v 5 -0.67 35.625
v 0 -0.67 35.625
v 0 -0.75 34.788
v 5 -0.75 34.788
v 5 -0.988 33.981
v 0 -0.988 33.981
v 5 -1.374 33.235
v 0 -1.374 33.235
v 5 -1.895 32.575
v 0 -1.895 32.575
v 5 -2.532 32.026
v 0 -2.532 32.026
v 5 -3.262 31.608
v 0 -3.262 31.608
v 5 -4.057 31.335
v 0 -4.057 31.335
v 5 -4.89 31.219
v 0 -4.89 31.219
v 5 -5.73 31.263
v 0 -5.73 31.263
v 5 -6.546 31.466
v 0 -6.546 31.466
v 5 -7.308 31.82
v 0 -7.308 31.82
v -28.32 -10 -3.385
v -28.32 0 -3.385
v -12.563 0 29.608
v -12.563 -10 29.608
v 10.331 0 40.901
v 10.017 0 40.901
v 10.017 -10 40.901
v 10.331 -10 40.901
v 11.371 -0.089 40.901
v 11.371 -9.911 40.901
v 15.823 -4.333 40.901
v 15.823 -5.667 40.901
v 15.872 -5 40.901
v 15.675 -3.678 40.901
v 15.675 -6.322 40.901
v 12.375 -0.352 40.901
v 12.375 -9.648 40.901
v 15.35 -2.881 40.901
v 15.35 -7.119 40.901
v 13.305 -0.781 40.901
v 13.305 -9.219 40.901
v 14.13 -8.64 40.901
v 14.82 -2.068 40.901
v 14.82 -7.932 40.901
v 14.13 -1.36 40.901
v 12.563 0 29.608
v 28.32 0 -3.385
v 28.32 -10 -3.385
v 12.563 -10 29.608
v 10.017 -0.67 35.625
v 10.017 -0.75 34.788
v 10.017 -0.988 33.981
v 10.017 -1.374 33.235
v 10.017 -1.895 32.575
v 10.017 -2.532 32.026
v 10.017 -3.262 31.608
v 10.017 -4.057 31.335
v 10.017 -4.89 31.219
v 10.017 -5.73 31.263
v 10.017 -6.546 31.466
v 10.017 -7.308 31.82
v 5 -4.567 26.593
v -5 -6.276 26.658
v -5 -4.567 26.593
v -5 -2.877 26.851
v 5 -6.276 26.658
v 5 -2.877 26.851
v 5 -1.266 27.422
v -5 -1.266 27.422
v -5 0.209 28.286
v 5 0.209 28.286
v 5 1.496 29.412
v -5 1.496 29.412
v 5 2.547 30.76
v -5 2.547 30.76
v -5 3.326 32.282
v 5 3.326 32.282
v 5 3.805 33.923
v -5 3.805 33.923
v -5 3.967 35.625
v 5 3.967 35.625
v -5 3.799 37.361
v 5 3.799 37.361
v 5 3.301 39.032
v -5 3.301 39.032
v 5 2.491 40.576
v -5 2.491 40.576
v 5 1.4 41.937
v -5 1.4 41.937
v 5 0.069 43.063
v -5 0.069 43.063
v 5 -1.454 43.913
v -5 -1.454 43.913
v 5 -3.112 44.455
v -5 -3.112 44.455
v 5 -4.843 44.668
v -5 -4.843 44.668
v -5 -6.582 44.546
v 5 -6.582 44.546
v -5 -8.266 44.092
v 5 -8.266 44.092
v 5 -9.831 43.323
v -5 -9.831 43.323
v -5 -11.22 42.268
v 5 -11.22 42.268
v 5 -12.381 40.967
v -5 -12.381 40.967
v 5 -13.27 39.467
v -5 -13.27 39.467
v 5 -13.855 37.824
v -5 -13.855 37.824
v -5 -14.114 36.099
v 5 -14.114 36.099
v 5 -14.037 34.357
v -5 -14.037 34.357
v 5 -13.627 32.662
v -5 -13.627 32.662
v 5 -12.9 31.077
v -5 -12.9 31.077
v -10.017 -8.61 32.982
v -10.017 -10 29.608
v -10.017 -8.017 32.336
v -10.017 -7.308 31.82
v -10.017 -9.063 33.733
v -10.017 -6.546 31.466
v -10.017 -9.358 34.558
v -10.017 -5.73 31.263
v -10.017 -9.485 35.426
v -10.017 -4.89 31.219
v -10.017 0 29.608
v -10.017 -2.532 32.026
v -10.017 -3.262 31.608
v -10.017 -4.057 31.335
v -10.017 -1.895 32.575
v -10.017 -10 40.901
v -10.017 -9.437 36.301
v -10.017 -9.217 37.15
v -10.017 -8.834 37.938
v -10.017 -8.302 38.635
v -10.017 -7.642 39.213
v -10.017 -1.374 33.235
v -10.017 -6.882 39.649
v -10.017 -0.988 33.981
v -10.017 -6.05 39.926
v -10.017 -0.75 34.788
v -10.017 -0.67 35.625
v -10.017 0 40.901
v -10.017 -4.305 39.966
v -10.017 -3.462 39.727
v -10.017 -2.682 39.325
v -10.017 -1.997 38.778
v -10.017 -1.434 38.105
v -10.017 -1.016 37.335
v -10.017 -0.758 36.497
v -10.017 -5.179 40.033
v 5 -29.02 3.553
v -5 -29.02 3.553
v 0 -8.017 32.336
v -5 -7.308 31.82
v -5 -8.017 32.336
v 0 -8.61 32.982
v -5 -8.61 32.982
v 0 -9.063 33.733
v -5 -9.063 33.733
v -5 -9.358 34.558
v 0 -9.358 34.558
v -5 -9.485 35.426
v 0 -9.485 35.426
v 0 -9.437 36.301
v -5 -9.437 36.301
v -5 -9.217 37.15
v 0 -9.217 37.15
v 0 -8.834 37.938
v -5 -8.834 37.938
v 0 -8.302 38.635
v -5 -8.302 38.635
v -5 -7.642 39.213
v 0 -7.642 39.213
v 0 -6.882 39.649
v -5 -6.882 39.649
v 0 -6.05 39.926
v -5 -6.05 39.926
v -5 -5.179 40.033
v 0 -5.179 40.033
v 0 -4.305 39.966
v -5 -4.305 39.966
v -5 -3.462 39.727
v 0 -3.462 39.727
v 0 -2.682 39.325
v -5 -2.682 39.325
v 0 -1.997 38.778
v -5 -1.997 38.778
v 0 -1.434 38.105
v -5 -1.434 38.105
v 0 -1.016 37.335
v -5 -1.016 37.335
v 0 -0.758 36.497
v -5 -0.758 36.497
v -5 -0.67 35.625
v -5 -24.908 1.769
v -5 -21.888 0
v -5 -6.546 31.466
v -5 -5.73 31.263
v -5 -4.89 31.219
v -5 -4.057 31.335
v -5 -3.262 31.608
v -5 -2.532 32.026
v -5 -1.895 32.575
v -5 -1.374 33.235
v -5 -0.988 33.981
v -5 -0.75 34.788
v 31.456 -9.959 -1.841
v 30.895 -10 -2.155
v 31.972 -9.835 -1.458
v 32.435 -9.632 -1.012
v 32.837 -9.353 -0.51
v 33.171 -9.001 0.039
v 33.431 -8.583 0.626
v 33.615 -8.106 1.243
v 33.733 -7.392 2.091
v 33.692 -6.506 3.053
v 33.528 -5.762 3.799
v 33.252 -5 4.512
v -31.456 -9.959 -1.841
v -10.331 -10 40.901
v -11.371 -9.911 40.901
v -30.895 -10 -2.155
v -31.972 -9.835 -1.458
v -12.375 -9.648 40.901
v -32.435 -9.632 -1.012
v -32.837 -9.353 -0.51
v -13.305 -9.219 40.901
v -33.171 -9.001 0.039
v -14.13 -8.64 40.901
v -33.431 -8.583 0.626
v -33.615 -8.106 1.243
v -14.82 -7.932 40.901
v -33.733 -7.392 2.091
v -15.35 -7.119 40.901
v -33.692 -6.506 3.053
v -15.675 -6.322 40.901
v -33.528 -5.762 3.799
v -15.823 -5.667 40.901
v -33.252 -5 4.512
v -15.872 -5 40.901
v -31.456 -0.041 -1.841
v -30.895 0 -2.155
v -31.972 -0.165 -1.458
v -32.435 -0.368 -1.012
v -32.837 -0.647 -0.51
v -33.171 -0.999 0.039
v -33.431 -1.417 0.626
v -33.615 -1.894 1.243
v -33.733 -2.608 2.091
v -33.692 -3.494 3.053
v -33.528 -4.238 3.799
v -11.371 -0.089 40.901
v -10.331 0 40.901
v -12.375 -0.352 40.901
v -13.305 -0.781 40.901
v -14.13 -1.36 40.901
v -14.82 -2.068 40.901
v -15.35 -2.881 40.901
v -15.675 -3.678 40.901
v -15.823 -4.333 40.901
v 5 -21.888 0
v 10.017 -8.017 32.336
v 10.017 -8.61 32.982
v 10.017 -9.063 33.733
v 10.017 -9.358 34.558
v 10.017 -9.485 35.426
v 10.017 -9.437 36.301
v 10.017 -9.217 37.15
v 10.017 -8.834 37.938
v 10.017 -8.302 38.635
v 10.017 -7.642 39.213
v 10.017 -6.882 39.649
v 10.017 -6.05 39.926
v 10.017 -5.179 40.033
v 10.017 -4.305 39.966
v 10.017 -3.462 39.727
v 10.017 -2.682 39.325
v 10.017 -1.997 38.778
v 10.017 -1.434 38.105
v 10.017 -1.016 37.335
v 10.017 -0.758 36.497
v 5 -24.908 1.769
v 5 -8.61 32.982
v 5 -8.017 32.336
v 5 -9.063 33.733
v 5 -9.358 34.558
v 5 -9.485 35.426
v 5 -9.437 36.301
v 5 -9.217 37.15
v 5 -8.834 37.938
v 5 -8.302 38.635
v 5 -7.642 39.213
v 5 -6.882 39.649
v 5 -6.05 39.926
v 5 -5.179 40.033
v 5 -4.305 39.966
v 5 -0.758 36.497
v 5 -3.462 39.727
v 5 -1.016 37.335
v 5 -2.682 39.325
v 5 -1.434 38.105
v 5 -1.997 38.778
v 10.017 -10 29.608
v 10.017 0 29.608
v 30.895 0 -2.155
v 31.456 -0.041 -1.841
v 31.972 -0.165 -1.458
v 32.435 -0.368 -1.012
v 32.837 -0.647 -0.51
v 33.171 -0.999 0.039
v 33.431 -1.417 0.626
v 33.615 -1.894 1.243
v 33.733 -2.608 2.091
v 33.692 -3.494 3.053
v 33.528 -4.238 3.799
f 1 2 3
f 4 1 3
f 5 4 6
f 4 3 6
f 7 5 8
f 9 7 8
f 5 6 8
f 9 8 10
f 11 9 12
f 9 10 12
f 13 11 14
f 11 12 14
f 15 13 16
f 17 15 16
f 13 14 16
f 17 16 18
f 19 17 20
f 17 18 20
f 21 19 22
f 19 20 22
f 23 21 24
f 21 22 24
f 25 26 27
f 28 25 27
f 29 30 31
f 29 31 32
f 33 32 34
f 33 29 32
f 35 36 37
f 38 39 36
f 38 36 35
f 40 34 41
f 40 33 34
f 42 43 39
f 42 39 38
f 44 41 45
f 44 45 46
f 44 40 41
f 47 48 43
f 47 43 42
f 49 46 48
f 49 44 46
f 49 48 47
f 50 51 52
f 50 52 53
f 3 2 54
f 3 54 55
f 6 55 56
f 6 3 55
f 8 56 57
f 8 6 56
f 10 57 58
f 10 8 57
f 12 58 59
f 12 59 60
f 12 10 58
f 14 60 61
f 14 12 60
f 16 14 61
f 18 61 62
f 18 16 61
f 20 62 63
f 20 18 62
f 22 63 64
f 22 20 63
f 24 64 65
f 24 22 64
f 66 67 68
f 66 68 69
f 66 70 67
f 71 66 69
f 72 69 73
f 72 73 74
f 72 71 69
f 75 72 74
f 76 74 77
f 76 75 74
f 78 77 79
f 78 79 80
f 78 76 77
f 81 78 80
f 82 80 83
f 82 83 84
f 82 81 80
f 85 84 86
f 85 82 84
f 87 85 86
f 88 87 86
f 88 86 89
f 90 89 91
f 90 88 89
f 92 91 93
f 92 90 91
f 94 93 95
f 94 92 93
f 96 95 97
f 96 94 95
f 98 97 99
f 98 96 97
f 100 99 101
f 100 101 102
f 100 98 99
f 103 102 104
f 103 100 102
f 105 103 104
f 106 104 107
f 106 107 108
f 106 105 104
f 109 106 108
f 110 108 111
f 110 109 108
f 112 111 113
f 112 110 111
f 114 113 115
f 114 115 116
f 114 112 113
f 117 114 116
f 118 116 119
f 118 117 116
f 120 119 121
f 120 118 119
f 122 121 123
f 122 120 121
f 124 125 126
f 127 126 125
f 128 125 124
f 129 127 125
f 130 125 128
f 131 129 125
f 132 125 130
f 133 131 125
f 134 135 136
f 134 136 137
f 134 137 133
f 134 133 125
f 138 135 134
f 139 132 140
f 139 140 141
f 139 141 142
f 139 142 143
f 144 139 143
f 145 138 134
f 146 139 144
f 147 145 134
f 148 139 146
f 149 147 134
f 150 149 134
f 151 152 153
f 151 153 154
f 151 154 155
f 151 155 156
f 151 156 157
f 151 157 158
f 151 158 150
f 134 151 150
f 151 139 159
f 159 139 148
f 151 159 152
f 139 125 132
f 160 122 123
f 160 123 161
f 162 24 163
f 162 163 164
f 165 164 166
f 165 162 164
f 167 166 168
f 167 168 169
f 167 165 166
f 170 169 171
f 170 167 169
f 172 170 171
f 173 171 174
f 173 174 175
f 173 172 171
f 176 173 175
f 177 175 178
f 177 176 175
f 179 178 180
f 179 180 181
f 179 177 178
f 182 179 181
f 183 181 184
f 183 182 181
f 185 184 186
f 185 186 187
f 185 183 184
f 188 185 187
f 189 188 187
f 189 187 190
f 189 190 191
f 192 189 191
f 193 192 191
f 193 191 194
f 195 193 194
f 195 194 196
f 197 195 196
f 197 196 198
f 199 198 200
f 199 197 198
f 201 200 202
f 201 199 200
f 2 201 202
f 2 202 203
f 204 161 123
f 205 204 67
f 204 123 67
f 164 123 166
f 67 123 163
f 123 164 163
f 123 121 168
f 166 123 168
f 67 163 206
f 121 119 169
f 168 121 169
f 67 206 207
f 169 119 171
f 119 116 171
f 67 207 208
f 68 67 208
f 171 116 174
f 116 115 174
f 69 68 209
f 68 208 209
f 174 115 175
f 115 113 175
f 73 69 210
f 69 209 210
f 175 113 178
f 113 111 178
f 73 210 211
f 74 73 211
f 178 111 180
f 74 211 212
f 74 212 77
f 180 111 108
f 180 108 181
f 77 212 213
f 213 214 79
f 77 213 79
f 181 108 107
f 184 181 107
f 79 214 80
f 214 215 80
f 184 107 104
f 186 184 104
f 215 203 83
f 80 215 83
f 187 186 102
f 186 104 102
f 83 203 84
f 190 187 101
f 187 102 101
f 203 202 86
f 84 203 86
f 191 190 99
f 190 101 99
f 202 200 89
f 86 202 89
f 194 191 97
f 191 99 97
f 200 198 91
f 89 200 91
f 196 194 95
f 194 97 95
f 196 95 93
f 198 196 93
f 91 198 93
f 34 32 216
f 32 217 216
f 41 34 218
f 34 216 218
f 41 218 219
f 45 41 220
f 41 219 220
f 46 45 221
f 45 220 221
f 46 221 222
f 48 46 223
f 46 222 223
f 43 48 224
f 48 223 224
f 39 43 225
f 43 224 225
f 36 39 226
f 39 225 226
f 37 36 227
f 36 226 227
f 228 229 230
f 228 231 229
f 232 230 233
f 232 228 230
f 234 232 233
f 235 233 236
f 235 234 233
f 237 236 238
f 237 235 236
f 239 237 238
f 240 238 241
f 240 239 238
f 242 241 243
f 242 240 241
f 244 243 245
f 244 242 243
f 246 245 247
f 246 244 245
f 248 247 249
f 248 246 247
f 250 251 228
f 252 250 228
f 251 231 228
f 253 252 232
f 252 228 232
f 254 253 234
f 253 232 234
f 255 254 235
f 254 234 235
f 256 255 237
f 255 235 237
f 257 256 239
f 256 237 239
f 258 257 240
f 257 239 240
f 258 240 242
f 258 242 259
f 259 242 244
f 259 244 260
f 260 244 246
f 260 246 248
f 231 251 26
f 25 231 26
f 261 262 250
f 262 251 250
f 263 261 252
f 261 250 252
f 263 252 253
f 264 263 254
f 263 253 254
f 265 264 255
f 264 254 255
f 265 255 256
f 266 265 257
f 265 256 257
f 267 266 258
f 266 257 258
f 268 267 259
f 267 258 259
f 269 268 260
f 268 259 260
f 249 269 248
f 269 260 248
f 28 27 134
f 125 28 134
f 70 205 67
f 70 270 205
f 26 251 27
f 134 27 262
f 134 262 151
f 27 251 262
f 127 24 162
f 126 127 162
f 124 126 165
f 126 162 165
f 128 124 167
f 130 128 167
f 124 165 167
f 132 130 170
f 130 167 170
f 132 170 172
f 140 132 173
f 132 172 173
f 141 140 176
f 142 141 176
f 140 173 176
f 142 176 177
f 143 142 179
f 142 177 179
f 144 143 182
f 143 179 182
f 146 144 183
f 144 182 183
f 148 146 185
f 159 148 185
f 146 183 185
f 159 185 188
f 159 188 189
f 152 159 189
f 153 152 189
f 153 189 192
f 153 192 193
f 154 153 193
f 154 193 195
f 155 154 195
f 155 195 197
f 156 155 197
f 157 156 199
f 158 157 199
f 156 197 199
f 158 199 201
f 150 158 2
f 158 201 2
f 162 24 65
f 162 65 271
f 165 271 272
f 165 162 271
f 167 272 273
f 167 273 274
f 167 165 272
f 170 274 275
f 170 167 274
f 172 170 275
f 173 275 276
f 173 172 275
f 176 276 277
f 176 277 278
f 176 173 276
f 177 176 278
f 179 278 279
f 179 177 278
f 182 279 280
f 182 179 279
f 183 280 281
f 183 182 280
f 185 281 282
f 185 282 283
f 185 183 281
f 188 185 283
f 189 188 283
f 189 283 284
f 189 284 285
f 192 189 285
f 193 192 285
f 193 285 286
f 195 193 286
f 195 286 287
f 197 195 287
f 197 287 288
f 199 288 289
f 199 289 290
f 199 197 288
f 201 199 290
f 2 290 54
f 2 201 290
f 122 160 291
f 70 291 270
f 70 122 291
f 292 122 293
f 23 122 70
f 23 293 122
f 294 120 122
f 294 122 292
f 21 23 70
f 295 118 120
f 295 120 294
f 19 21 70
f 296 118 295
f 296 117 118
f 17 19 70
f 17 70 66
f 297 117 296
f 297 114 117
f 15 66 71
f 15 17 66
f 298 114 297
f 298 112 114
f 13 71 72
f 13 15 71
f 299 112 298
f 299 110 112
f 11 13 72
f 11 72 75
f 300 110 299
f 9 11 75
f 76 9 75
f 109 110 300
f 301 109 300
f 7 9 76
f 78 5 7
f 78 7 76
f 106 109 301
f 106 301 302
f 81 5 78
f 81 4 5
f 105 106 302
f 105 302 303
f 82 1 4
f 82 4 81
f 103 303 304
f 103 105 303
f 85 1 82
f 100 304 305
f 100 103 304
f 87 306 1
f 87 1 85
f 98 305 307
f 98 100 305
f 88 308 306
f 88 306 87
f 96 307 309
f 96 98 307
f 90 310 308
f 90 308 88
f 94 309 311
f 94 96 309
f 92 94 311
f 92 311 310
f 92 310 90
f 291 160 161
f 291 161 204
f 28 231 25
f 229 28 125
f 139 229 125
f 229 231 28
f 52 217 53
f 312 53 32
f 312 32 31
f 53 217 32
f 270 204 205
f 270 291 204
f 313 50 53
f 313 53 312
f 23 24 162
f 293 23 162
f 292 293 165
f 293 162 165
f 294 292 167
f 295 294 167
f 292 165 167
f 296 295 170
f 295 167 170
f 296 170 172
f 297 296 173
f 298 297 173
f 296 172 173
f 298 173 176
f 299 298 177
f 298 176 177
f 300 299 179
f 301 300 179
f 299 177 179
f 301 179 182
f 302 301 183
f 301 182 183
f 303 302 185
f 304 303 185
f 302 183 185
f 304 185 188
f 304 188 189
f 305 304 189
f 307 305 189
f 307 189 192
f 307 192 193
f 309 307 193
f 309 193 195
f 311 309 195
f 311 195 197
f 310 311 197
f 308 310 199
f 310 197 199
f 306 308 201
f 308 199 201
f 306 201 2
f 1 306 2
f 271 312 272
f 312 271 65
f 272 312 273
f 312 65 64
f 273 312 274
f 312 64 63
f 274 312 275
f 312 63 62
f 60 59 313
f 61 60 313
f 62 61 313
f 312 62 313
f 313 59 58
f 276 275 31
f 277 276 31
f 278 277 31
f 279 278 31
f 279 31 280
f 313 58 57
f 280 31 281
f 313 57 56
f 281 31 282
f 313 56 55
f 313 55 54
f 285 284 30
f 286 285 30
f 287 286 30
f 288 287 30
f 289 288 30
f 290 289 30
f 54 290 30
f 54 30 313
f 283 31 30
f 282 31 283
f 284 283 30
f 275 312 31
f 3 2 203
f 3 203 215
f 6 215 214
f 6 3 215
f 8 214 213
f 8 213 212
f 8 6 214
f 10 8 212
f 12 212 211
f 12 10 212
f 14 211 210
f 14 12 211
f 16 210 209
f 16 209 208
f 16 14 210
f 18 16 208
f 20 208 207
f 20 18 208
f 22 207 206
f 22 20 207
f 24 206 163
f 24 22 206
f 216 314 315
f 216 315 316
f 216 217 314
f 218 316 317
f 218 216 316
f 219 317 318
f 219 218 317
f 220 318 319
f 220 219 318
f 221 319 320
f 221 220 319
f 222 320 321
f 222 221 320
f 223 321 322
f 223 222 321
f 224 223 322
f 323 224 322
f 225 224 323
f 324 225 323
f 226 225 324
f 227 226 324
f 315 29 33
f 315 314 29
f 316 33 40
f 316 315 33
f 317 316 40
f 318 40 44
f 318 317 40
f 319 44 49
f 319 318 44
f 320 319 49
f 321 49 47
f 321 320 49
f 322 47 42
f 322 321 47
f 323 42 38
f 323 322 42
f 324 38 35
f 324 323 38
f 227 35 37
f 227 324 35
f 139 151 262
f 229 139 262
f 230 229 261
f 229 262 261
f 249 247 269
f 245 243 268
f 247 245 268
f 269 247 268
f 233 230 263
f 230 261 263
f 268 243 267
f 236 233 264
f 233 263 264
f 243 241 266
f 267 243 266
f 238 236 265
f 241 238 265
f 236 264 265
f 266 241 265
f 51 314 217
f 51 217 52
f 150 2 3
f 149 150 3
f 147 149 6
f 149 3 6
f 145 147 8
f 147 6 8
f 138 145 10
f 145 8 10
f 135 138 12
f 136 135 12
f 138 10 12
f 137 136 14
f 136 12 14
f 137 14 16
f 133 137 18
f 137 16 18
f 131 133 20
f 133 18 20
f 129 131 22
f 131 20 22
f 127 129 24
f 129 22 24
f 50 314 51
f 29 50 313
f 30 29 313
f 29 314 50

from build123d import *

# Parameters (mm, degrees)
F1_DEPTH = 10
F3_DEPTH = 10.01716
F4_R     = 4.99999
F6_DEPTH = 5


# Not quite as in the source:
# - a fillet or chamfer is up to 0.001 mm smaller than in the source, because OpenCascade refuses the exact size


with BuildPart() as f1:
    # F0 (on Front) → F1 (new body)
    with BuildSketch(Plane.XZ):
        Polygon((-12.5626804332, 29.607558623), (0, 29.607558623), (0, 40.9011654556), (-15.8720966429, 40.9011654556), (-35.4069806635, 0), (-28.3201927203, -3.3847343715), align=None)
    extrude(amount=F1_DEPTH)

    # F2 (on face) → F3 (cut)
    with BuildSketch(Plane.YZ):
        Polygon((-10, 29.607558623), (-8.6038469049, 29.607558623), (0, 29.607558623), (0, 40.9011654556), (-10, 40.9011654556), align=None)
        with BuildLine():
            ThreePointArc((-7.3082493459, 31.8197726236), (-7.2727253308, 39.4503255628), (-0.6703296735, 35.6247574091))
            ThreePointArc((-0.6703296735, 35.6247574091), (-2.8869450444, 31.7991892554), (-7.3082493459, 31.8197726236))
        make_face(mode=Mode.SUBTRACT)
    extrude(amount=-F3_DEPTH, mode=Mode.SUBTRACT)

    # F4 (radius 5 in the source; OpenCascade refuses exactly that, so slightly less here)
    f4_edges = [f1.edges().sort_by_distance(p)[0] for p in [
        (-25.639539, -10, 20.450583),
        (-25.639539, 0, 20.450583),
        (-35.406981, -5, 0),
    ]]
    fillet(f4_edges, radius=F4_R)

    # F5: F1 across face


with BuildPart() as f1_1:
    add(f1.part)
    add(f1.part.mirror(Plane(origin=(0, -5.0798351876, 35.6247574091), x_dir=(0, 1, 0), z_dir=(1, 0, 0))))


with BuildPart() as f6:
    # F2 (on face) → F6 (new body, symmetric)
    with BuildSketch(Plane.YZ):
        with BuildLine():
            ThreePointArc((-12.9000592681, 31.0769466924), (-11.4864525822, 29.2377596368), (-9.6516098344, 27.8185186501))
            ThreePointArc((-9.6516098344, 27.8185186501), (-8.0214187442, 27.0699007087), (-6.2755623418, 26.6576662667))
            ThreePointArc((-6.2755623418, 26.6576662667), (0.8792497216, 28.8183050271), (3.9666274903, 35.6247574091))
            ThreePointArc((3.9666274903, 35.6247574091), (-7.4349489542, 44.3592823607), (-12.9000592681, 31.0769466924))
        make_face()
        Polygon((0, 29.607558623), (-8.6038469049, 29.607558623), (-10, 29.607558623), (-10, 40.9011654556), (0, 40.9011654556), align=None, mode=Mode.SUBTRACT)
        with BuildLine():
            Line((-24.9078488827, 1.768712223), (-9.6516098344, 27.8185186501))
            ThreePointArc((-9.6516098344, 27.8185186501), (-11.4864525822, 29.2377596368), (-12.9000592681, 31.0769466924))
            Line((-12.9000592681, 31.0769466924), (-29.0196302747, 3.553013495))
            Line((-29.0196302747, 3.553013495), (-24.9078488827, 1.768712223))
        make_face()
        with BuildLine():
            ThreePointArc((-6.2755623418, 26.6576662667), (-8.0214187442, 27.0699007087), (-9.6516098344, 27.8185186501))
            Line((-9.6516098344, 27.8185186501), (-24.9078488827, 1.768712223))
            Line((-24.9078488827, 1.768712223), (-21.8877984701, 0))
            Line((-21.8877984701, 0), (-6.2755623418, 26.6576662667))
        make_face()
        Polygon((-10, 29.607558623), (-8.6038469049, 29.607558623), (0, 29.607558623), (0, 40.9011654556), (-10, 40.9011654556), align=None)
        with BuildLine():
            ThreePointArc((-7.3082493459, 31.8197726236), (-7.2727253308, 39.4503255628), (-0.6703296735, 35.6247574091))
            ThreePointArc((-0.6703296735, 35.6247574091), (-2.8869450444, 31.7991892554), (-7.3082493459, 31.8197726236))
        make_face(mode=Mode.SUBTRACT)
    extrude(amount=F6_DEPTH, both=True)


solid = Compound([f1_1.part, f6.part])
